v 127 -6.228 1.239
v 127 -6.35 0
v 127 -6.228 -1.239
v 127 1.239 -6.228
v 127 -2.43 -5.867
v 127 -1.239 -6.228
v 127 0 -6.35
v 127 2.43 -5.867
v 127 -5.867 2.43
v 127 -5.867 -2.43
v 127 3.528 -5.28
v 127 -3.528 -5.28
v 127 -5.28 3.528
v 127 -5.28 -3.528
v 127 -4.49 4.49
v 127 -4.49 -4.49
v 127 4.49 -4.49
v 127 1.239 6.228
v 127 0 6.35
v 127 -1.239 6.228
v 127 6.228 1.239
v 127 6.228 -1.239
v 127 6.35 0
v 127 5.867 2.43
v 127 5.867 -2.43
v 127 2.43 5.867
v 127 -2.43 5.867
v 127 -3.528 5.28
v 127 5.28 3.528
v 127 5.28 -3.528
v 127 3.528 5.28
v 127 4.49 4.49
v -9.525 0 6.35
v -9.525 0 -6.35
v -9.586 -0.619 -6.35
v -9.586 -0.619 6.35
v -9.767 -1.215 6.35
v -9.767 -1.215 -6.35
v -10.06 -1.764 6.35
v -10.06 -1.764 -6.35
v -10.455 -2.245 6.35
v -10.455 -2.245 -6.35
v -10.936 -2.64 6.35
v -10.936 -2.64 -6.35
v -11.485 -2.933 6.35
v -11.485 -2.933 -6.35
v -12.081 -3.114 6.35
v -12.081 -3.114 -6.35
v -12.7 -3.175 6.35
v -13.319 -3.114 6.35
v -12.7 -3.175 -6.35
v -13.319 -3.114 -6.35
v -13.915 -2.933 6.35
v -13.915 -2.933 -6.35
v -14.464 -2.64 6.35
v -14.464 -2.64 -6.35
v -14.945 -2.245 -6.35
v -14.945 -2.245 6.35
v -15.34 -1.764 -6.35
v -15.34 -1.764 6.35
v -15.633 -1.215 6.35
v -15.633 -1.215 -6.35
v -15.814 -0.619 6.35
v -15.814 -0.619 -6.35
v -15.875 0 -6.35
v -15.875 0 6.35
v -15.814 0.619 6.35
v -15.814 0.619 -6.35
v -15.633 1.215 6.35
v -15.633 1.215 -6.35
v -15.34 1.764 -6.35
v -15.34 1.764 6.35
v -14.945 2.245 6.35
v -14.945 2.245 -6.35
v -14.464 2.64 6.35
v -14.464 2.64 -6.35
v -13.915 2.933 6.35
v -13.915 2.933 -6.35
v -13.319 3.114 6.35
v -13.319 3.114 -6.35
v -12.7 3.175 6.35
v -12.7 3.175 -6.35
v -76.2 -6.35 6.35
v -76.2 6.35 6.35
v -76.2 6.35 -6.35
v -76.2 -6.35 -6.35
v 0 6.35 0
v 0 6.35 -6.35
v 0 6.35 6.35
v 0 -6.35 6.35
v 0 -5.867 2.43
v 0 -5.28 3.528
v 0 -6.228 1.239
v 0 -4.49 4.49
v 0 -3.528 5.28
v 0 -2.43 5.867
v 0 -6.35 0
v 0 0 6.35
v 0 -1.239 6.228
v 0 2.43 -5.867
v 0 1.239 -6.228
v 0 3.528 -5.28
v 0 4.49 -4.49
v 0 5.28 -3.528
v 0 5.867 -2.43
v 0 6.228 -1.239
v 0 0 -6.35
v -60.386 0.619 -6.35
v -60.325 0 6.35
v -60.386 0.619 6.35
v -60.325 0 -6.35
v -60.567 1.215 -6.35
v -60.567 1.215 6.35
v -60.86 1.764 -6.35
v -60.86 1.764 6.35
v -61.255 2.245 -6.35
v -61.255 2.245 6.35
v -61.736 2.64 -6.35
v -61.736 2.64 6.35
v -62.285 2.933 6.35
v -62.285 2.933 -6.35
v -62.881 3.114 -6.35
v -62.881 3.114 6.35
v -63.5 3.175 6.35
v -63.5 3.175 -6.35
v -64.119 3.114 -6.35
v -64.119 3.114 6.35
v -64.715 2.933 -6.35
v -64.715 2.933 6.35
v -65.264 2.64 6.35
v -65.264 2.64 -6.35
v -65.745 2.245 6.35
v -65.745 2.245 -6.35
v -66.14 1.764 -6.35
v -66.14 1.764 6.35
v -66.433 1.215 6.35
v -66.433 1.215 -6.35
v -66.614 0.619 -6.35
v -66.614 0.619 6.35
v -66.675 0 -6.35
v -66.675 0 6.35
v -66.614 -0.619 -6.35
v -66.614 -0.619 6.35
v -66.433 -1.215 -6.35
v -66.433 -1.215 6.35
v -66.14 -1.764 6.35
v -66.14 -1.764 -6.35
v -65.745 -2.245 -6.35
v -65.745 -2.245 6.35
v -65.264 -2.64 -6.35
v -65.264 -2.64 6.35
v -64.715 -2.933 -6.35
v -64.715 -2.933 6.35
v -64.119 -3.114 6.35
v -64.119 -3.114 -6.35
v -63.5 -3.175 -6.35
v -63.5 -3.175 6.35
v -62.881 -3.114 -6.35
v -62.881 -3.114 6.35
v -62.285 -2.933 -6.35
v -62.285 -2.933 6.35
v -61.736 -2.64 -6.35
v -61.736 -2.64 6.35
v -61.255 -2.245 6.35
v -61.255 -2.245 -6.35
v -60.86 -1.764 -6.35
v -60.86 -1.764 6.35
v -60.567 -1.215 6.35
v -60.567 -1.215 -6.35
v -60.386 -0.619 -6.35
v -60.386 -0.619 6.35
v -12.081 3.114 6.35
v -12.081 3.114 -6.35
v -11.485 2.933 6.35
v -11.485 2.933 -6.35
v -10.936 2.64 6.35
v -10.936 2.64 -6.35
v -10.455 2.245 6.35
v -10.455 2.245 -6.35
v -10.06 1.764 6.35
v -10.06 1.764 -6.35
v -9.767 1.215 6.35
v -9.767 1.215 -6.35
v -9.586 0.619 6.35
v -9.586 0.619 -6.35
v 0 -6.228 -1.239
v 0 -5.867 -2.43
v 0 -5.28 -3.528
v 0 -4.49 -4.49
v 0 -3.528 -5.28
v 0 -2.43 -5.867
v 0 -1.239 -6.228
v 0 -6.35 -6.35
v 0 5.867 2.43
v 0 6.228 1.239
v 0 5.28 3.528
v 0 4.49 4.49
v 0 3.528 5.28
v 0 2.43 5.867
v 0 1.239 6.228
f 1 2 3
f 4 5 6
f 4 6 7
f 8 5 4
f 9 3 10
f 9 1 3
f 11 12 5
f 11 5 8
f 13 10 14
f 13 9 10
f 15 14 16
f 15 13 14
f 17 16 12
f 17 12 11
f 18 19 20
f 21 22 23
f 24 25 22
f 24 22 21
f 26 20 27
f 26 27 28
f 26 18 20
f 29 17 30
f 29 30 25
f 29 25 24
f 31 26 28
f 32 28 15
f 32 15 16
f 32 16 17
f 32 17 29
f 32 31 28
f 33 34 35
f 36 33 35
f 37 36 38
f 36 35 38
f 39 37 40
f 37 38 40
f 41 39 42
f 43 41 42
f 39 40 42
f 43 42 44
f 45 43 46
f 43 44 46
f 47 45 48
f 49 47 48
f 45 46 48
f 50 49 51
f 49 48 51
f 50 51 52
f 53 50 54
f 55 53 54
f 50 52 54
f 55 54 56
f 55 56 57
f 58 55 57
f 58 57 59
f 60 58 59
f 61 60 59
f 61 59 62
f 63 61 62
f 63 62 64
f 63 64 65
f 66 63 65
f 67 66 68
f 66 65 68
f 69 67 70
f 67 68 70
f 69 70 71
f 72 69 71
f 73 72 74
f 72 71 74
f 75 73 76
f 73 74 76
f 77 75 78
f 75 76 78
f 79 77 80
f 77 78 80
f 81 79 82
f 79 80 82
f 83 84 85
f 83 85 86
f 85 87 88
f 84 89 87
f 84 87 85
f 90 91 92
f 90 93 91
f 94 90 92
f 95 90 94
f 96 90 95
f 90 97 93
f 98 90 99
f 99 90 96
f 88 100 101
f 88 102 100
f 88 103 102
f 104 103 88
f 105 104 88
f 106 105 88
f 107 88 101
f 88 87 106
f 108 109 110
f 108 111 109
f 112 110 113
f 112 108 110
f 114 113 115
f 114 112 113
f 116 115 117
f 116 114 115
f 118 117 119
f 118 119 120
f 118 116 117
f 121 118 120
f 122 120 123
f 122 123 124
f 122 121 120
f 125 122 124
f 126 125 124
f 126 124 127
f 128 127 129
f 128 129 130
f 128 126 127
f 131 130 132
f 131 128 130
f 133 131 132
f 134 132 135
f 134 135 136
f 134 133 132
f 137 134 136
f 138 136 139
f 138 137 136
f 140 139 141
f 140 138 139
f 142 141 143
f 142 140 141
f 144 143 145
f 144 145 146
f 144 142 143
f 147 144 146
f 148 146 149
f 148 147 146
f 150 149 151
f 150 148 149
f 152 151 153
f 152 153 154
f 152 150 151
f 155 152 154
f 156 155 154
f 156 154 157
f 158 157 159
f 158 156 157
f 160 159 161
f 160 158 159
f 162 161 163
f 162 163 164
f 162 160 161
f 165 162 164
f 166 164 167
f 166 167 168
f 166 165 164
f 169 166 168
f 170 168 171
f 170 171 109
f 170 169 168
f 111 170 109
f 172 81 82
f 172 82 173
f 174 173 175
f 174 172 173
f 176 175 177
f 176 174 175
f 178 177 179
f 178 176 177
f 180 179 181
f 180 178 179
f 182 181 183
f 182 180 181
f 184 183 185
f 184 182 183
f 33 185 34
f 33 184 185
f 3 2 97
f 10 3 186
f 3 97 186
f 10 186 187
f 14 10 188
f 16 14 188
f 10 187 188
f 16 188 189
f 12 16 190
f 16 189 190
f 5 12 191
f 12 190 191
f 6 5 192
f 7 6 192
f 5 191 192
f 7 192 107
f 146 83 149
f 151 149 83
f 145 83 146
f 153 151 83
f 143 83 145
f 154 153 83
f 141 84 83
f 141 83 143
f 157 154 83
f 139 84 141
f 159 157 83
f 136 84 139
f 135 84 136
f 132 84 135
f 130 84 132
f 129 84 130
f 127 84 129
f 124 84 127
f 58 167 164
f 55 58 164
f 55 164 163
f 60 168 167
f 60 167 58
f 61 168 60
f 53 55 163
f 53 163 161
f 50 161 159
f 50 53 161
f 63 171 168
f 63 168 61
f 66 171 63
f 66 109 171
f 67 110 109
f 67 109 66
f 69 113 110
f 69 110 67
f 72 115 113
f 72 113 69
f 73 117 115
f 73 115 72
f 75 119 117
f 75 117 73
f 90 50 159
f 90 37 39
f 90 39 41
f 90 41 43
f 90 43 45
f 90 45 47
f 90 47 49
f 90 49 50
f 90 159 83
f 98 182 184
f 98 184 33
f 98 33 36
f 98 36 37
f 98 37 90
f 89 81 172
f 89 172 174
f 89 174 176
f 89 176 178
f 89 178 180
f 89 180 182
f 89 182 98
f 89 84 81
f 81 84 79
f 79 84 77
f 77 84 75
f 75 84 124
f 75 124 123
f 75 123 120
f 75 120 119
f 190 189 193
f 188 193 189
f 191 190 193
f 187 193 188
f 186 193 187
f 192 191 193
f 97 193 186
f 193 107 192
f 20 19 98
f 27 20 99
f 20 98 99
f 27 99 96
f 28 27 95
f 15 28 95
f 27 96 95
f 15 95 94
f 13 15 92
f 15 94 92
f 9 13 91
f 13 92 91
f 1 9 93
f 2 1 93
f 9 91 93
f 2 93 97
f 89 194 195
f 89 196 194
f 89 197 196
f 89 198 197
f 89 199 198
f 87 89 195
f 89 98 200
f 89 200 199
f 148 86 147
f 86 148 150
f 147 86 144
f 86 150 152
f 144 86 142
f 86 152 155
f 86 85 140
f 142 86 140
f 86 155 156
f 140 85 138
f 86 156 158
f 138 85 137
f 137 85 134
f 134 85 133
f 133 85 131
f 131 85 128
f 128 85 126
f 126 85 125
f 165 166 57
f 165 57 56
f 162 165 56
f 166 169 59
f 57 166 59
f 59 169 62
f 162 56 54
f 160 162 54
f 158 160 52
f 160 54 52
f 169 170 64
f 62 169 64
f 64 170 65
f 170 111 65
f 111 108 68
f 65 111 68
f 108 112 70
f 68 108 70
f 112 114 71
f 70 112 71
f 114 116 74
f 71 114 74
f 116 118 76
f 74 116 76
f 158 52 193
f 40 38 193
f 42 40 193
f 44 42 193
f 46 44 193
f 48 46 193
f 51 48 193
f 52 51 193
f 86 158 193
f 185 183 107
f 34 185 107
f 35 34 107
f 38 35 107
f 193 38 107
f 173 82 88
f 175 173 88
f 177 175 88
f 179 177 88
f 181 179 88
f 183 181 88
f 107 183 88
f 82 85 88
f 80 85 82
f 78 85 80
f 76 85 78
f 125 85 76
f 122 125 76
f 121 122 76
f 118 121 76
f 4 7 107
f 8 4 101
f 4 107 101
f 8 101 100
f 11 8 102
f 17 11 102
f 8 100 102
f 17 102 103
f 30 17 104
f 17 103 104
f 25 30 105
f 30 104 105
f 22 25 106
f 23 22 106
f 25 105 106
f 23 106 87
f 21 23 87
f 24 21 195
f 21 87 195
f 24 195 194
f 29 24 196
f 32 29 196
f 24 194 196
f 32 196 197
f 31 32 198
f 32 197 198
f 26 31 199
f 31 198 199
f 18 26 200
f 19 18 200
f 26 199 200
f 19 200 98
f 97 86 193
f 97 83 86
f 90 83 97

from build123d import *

# Parameters (mm, degrees)
F0_R     = 3.175
F1_DEPTH = 6.35
F3_DEPTH = 127


with BuildPart() as f1:
    # F0 (on Top) → F1 (new body, symmetric)
    with BuildSketch(Plane.XY):
        Polygon((0, -6.35), (0, 0), (0, 6.35), (-12.7, 6.35), (-76.2, 6.35), (-76.2, -6.35), align=None)
        with Locations((-63.5, 0)):
            Circle(F0_R, mode=Mode.SUBTRACT)
        with BuildLine():
            ThreePointArc((-9.525, 0), (-14.945064, -2.245064), (-12.7, 3.175))
            ThreePointArc((-12.7, 3.175), (-10.454936, 2.245064), (-9.525, 0))
        make_face(mode=Mode.SUBTRACT)
    extrude(amount=F1_DEPTH, both=True)

    # F2 (on face) → F3 (join)
    with BuildSketch(Plane.YZ):
        with BuildLine():
            ThreePointArc((0, -6.35), (4.490128, -4.490128), (6.35, 0))
            ThreePointArc((6.35, 0), (4.490128, 4.490128), (0, 6.35))
            ThreePointArc((0, 6.35), (-4.490128, 4.490128), (-6.35, 0))
            ThreePointArc((-6.35, 0), (-4.490128, -4.490128), (0, -6.35))
        make_face()
    extrude(amount=F3_DEPTH)


solid = f1.part
